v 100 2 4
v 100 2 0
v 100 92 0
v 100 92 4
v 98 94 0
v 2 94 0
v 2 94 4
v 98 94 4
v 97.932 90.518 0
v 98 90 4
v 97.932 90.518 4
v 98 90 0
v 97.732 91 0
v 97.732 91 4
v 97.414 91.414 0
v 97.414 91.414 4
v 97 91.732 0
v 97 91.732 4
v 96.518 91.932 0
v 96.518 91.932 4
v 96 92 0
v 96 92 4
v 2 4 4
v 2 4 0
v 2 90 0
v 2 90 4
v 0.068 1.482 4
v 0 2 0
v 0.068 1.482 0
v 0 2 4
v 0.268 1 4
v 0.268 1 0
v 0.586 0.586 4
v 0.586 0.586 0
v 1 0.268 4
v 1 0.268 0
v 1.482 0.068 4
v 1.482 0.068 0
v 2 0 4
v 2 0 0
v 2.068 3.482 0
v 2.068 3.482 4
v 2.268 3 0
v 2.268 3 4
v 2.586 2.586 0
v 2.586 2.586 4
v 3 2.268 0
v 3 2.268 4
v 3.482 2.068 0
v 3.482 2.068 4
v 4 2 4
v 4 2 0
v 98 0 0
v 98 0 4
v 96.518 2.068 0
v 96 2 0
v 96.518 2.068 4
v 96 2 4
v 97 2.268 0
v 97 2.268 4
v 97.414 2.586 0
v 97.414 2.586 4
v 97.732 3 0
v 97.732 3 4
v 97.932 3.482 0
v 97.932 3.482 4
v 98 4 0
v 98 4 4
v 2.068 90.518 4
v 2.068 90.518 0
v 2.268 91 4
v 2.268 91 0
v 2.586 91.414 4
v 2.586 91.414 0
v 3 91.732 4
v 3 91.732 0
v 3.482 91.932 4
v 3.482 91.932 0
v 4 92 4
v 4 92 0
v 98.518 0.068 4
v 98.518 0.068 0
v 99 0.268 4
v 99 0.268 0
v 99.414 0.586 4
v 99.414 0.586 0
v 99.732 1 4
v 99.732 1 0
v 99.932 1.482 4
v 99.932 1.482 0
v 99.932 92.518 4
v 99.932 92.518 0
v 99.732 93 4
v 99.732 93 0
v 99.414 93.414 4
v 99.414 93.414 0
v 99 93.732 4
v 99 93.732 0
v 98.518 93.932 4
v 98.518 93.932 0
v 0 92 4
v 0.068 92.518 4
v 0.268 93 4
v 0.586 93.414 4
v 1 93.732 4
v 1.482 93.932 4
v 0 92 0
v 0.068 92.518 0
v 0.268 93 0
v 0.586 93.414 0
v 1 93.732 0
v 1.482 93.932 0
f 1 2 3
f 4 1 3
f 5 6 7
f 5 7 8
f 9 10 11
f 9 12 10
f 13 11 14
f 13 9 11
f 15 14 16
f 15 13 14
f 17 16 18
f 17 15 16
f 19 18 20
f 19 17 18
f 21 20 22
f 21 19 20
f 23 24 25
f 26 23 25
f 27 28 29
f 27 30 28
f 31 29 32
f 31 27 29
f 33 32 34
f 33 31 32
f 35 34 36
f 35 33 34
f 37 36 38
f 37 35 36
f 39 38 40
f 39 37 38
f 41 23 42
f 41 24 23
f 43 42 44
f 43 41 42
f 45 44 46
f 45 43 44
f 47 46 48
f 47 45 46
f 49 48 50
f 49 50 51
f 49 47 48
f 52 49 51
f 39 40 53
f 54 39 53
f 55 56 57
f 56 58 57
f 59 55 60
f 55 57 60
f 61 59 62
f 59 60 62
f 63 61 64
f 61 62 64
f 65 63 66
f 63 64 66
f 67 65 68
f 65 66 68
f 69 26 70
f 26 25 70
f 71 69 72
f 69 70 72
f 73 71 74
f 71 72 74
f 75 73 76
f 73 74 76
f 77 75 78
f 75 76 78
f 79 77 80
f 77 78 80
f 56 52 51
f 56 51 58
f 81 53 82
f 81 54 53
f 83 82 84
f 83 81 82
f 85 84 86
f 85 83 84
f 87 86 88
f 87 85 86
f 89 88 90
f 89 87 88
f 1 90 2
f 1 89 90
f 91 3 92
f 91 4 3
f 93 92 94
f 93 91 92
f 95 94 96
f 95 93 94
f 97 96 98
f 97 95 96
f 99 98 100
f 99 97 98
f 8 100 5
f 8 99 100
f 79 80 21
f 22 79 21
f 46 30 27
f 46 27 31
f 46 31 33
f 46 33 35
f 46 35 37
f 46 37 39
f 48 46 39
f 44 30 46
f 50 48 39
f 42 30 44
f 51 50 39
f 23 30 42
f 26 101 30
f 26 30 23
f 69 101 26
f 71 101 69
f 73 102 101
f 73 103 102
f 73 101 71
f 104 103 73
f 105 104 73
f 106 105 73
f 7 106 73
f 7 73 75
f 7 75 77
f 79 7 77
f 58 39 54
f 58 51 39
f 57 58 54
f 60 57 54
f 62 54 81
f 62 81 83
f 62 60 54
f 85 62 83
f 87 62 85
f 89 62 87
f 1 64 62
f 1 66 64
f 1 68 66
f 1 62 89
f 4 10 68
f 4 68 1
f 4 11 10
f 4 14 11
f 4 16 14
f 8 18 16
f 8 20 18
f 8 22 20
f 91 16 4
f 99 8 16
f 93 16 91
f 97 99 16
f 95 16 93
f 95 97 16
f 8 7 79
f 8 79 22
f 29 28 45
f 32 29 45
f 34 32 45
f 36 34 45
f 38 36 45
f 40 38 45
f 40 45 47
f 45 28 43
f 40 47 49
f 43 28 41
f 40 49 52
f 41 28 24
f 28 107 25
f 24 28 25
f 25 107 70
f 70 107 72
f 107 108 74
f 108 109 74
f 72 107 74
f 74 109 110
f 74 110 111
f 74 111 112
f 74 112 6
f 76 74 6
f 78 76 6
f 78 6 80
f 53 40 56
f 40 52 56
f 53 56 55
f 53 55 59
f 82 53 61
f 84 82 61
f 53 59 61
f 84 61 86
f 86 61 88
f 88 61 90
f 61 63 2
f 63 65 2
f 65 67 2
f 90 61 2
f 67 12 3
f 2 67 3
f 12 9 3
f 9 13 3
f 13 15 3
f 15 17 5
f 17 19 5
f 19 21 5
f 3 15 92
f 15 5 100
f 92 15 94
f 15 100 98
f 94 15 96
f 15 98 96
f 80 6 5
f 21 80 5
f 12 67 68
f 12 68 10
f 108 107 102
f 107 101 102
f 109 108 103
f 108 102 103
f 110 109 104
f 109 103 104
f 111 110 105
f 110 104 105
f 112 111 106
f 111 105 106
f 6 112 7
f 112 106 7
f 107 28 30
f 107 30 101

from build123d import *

# Parameters (mm, degrees)
F0_W     = 100
F0_H     = 94
F1_DEPTH = 4
F2_T     = -2
F3_R     = 2


with BuildPart() as f1:
    # F0 (on Top) → F1 (new body)
    with BuildSketch(Plane.XY):
        with Locations((50, 47)):
            Rectangle(F0_W, F0_H)
    extrude(amount=F1_DEPTH)

    # F2
    f2_openings = [f1.faces().sort_by_distance(p)[0] for p in [
        (50, 47, 4),
        (50, 47, 0),
    ]]
    offset(amount=F2_T, openings=f2_openings)

    # F3
    f3_edges = [f1.edges().sort_by_distance(p)[0] for p in [
        (0, 94, 2),
        (0, 0, 2),
        (100, 94, 2),
        (100, 0, 2),
        (2, 92, 2),
        (2, 2, 2),
        (98, 92, 2),
        (98, 2, 2),
    ]]
    fillet(f3_edges, radius=F3_R)


solid = f1.part
